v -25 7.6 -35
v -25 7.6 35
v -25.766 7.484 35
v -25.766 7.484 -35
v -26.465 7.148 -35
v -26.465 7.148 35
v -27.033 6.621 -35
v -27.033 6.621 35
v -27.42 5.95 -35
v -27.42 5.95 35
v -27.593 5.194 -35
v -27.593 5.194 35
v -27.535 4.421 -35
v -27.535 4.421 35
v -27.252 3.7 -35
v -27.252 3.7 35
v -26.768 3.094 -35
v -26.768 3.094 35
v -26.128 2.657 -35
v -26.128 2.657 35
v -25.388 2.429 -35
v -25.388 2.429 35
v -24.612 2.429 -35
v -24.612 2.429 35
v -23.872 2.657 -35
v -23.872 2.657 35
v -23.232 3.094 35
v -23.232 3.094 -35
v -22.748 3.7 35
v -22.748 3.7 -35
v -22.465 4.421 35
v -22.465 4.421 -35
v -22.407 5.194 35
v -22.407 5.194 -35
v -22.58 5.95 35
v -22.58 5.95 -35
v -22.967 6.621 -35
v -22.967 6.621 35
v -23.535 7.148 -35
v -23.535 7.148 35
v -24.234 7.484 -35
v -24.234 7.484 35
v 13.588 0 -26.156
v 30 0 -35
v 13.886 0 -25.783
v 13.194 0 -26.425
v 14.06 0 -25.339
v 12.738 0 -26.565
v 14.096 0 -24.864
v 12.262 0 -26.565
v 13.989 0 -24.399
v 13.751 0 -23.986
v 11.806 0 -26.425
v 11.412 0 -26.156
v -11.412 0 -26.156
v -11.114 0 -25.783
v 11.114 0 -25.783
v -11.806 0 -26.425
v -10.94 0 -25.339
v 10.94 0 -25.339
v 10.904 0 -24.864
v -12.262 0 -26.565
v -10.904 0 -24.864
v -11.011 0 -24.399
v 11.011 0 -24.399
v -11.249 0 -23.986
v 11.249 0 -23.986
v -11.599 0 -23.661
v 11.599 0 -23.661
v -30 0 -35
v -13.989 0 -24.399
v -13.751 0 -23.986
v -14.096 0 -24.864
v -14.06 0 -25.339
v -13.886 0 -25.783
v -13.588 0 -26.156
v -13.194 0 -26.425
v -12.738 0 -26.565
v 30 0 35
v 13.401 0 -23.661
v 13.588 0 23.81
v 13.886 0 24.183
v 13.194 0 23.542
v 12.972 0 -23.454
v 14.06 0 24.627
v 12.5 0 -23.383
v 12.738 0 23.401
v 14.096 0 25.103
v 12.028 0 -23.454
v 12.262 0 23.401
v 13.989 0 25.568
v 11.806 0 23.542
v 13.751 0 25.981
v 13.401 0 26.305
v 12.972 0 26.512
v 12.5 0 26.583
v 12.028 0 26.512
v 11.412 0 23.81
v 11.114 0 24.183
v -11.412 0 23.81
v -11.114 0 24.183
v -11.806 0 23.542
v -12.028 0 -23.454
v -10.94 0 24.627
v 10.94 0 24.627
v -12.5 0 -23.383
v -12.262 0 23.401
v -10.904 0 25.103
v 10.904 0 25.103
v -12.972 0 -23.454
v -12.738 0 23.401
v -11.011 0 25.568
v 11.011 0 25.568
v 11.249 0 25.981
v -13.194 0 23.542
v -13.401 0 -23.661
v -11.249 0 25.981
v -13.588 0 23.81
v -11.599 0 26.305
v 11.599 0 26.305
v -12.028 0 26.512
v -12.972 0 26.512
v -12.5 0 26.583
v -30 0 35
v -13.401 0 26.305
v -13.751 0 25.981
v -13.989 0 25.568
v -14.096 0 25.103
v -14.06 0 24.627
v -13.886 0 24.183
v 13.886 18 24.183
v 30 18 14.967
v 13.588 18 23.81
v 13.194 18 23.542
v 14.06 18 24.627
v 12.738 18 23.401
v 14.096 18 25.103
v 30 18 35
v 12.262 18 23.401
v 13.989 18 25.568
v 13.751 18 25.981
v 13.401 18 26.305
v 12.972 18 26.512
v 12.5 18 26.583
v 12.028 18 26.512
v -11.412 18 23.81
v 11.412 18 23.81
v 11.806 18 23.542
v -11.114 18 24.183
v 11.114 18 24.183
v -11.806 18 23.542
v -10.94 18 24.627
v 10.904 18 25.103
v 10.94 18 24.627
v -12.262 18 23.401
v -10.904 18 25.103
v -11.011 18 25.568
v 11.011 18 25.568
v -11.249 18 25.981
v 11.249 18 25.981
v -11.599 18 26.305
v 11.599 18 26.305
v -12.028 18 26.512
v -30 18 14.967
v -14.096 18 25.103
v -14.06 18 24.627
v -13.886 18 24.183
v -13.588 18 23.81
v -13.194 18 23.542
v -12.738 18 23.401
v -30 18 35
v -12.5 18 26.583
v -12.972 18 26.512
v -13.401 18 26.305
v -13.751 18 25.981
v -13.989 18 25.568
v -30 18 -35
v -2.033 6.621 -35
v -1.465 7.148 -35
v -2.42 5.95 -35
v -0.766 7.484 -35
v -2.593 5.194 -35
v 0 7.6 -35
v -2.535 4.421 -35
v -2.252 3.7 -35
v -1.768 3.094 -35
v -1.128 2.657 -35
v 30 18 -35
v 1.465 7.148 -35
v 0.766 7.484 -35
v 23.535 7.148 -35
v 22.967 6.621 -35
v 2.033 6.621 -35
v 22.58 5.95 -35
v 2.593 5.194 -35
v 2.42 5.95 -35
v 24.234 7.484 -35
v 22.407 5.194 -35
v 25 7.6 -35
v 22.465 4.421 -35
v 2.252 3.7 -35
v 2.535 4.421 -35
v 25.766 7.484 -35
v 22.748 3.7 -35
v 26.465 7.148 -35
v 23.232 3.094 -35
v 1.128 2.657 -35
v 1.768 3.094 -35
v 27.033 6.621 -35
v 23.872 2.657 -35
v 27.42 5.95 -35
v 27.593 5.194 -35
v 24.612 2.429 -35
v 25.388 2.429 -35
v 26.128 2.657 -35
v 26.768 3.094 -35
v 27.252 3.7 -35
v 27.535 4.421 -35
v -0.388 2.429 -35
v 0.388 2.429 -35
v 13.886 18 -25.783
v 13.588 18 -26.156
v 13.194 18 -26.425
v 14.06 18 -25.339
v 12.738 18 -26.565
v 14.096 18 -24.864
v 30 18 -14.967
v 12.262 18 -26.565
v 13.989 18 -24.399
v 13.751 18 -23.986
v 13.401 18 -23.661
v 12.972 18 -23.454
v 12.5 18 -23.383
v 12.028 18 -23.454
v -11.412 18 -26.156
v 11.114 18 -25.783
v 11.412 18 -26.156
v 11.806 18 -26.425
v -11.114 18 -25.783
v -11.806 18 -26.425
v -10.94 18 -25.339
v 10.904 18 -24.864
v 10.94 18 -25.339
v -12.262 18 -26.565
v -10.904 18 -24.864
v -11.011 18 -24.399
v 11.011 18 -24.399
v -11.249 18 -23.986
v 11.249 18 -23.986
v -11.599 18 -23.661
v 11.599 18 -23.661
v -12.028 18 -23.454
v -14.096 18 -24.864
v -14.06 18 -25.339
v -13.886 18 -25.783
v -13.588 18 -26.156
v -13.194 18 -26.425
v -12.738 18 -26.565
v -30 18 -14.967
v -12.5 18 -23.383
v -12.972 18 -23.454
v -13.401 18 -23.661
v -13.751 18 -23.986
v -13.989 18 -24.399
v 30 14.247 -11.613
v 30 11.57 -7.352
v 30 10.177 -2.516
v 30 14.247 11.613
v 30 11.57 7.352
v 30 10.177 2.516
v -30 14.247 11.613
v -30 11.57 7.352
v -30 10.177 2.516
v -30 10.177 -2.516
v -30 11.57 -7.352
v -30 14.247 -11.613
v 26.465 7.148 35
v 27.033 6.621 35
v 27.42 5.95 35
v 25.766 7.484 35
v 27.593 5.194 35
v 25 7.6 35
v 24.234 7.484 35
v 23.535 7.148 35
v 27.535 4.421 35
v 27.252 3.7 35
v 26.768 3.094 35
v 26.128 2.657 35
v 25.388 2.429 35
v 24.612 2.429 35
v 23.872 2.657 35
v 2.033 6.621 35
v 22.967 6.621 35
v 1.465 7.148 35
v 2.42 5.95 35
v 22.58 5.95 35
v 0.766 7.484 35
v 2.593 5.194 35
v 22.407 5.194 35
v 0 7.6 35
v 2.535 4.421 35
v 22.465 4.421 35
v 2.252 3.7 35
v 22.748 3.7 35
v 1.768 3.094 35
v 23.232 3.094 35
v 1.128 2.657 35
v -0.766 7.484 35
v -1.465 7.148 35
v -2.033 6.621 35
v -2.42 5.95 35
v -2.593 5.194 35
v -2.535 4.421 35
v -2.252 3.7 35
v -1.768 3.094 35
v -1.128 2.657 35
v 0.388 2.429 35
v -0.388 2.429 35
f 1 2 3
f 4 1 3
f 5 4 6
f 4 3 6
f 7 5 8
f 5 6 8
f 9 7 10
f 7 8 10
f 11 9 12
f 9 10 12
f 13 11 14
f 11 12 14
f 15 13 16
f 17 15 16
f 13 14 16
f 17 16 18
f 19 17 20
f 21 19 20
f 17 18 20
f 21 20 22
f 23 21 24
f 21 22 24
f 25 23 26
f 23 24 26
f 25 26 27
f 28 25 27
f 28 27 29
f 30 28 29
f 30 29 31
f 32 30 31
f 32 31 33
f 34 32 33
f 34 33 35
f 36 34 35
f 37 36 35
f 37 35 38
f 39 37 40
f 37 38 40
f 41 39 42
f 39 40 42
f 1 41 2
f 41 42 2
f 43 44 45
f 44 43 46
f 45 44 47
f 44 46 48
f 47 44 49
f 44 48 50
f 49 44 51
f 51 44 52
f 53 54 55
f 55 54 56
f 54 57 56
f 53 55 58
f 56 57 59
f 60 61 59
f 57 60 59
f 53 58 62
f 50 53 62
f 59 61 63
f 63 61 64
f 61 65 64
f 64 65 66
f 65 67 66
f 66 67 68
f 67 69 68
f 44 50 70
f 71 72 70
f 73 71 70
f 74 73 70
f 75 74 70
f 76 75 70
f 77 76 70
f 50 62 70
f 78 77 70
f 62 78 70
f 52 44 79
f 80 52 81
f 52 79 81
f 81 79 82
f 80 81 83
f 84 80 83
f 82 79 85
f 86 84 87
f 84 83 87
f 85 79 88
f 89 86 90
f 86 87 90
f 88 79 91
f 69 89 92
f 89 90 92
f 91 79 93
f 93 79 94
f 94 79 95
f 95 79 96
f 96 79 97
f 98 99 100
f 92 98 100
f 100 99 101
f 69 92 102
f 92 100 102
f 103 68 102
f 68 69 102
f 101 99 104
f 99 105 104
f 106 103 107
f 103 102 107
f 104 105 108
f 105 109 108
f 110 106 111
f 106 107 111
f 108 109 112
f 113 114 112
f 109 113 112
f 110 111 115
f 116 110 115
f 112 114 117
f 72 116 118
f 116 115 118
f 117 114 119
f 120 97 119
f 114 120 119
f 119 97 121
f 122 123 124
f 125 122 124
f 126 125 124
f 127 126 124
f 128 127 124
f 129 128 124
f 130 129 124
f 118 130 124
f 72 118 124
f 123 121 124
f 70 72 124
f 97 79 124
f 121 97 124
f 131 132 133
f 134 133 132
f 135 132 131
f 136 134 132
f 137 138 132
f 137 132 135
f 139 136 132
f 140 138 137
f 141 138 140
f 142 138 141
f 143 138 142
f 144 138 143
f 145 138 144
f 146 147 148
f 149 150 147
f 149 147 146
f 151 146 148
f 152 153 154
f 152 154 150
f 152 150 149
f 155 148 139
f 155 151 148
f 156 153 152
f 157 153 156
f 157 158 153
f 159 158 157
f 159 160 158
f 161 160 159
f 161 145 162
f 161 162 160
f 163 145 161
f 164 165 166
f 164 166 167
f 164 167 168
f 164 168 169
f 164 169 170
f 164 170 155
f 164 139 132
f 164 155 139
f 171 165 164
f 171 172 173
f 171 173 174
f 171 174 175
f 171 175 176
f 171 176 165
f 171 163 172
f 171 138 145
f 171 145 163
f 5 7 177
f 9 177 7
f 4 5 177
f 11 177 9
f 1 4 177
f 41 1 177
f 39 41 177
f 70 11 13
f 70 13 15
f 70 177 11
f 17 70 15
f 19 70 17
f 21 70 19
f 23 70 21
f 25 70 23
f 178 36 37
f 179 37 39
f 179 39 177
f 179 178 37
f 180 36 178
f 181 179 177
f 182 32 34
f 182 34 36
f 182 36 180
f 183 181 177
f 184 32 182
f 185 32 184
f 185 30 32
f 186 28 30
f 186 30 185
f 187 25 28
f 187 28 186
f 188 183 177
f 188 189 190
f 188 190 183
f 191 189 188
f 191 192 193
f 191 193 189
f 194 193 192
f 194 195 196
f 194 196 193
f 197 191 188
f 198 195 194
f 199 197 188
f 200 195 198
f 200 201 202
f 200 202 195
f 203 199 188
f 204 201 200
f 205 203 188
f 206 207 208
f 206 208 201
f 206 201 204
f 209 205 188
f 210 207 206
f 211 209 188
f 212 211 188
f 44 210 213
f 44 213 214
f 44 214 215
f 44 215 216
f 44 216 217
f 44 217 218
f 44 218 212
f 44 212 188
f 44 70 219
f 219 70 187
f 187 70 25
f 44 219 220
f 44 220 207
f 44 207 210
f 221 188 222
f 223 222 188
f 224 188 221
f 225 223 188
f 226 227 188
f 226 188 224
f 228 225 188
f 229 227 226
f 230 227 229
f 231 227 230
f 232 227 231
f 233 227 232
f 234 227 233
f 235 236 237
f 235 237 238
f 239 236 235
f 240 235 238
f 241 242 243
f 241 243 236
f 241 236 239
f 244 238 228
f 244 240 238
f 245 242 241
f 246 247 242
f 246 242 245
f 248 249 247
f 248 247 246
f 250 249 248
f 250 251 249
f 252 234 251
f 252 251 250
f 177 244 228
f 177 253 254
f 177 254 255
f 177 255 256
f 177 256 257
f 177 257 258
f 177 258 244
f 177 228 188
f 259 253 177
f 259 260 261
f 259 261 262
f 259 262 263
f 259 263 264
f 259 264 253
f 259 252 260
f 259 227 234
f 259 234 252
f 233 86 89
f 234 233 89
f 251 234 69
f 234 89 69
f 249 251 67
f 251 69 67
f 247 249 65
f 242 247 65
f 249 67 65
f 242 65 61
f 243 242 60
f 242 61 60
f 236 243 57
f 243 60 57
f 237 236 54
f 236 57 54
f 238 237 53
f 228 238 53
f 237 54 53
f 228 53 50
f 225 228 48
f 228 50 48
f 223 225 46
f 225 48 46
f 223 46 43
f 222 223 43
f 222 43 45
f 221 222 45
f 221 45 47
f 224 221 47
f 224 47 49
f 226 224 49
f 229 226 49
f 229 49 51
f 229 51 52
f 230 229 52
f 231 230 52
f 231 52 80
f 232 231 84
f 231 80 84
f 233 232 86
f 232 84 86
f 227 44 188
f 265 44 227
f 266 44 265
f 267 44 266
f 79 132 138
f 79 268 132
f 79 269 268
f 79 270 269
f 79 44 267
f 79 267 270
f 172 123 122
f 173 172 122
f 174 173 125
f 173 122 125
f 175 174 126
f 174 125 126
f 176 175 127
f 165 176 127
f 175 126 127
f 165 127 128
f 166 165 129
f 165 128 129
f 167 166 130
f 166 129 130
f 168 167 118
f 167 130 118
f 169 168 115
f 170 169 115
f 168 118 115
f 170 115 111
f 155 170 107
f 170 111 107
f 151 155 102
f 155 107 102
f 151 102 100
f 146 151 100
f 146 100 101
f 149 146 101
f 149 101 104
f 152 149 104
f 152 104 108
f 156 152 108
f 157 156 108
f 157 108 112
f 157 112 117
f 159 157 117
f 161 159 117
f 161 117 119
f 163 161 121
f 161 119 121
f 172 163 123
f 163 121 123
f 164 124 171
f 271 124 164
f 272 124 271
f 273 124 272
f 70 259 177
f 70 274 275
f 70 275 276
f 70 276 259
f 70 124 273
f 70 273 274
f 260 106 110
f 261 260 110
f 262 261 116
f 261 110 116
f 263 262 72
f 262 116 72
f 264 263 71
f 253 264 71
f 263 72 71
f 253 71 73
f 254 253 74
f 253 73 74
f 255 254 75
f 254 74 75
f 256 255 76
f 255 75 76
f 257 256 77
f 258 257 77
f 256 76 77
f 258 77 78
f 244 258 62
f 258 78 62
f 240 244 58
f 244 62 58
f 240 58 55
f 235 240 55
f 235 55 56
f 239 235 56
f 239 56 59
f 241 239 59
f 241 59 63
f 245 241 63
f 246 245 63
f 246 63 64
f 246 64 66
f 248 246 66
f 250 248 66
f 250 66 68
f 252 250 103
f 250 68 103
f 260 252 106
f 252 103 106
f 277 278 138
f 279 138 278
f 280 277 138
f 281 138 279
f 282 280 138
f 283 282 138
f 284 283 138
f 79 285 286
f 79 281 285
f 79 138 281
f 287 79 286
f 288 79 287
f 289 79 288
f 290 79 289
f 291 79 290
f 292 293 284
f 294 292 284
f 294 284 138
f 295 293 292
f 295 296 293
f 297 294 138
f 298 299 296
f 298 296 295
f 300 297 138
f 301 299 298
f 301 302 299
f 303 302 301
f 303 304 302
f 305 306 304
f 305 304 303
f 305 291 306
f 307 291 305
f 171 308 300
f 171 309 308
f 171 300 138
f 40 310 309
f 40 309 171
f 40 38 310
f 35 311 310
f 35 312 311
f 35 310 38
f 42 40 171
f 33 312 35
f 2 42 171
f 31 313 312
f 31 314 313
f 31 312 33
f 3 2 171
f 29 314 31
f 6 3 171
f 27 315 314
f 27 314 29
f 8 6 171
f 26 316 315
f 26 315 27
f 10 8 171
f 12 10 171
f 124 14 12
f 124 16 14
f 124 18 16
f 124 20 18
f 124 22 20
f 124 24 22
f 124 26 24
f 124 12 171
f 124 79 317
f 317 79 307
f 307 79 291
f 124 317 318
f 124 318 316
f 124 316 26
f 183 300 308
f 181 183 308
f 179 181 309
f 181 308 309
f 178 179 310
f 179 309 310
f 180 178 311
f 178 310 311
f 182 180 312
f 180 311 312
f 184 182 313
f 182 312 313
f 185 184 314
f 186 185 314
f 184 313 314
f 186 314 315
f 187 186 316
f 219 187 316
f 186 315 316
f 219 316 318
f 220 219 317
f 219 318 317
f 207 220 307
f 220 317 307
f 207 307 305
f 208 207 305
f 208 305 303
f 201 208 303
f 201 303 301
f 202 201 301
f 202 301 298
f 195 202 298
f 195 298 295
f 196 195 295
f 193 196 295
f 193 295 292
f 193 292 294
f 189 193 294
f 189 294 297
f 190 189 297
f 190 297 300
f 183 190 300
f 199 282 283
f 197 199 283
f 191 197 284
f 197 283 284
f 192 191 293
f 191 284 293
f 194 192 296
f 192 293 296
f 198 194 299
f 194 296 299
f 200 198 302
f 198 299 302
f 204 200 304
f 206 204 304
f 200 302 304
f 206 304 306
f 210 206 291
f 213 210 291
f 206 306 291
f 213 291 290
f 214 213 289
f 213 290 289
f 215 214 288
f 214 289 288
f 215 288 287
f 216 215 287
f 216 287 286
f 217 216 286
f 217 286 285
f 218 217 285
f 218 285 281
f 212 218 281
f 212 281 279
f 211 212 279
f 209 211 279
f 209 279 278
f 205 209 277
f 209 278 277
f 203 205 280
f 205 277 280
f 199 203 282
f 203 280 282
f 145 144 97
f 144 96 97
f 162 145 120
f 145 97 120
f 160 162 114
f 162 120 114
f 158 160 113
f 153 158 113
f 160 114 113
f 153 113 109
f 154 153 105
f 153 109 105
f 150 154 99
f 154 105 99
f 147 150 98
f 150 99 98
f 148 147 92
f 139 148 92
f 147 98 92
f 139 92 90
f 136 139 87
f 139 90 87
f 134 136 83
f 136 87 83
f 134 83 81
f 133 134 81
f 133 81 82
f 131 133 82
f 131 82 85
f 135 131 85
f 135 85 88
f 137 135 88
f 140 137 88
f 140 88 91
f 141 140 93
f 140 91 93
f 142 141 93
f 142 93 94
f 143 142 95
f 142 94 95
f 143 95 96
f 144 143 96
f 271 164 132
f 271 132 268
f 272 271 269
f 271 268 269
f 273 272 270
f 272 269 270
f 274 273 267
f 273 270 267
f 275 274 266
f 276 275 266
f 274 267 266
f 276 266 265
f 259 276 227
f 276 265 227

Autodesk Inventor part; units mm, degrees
ref_plane "YZ Plane" through (0, 0, 0) normal (1, 0, 0) x (0, 1, 0)
ref_plane "XZ Plane" through (0, 0, 0) normal (0, 1, 0) x (-1, 0, 0)
ref_plane "XY Plane" through (0, 0, 0) normal (0, 0, 1) x (1, 0, 0)
sketch "Sketch1" plane through (0, 0, 0) normal (0, 1, 0) x (-1, 0, 0)
  line L0 (-30, 35) -> (30, 35)
  line L1 (30, 35) -> (30, -35)
  line L2 (30, -35) -> (-30, -35)
  line L3 (-30, -35) -> (-30, 35)
  line L4 (-30, 35) -> (30, -35) construction
  line L5 (30, 35) -> (-30, -35) construction
  point P0 (0, 0)
  dimension "d0" = 60
  dimension "d1" = 70
extrude "Extrusion1" add sketch "Sketch1" along normal blind 18
sketch "Sketch2" plane through (30, 0, -35) normal (0, 0, -1) x (-1, 0, 0)
  line L0 (0, 0) -> (60, 0) projected
  line L1 (60, 0) -> (60, 18) projected
  line L2 (0, 18) -> (60, 18) projected
  line L3 (0, 0) -> (0, 18) projected
  line L4 (0, 5) -> (60, 5) construction
  line L5 (30, 0) -> (30, 18) construction
  line L6 (0, 18) -> (60, 18) projected
  point P0 (5, 5)
  point P1 (30, 5)
  point P2 (55, 5)
  dimension "d4" = 5
  dimension "d6" = 5
hole "Hole1" at (25, 5, -35) at (0, 5, -35) at (-25, 5, -35) direction (0, 0, 1) diameter 5.2 end through all
sketch "Sketch3" plane through (30, 0, 35) normal (1, 0, 0) x (0, 0, -1)
  line L0 (0, 2.4) -> (70, 2.4) projected
  line L1 (0, 2.4) -> (0, 7.6) projected
  line L2 (70, 7.6) -> (70, 2.4) projected
  line L3 (0, 7.6) -> (70, 7.6) projected
  line L4 (0, 0) -> (70, 0) projected
  line L5 (70, 0) -> (70, 18) projected
  line L6 (0, 18) -> (70, 18) projected
  line L7 (0, 0) -> (0, 18) projected
  circle A0 centre (35, 28) radius 18
  point P0 (35, 0)
  point P1 (35, 0)
  point P2 (49.9666, 18)
  point P3 (20.0334, 18)
  dimension "d14" = 36
  dimension "d15" = 10
extrude "Extrusion2" cut sketch "Sketch3" against normal through all contours L6 A0 picked at (30.9706, 16.8877)
sketch "Sketch4" plane through (0, 18, 0) normal (0, 1, 0) x (1, 0, 0)
  line L0 (-22.4, -35) -> (-27.6, -35) projected
  line L1 (-27.6, 35) -> (-22.4, 35) projected
  line L2 (2.6, -35) -> (-2.6, -35) projected
  line L3 (-2.6, 35) -> (2.6, 35) projected
  line L4 (27.6, -35) -> (22.4, -35) projected
  line L5 (22.4, 35) -> (27.6, 35) projected
  line L6 (-30, -35) -> (30, -35) projected
  line L7 (-12.5, -35) -> (-12.5, 35) construction
  line L8 (2.6, 35) -> (22.4, 35)
  line L9 (2.6, -35) -> (2.6, 35) projected
  line L10 (-22.4, 35) -> (-2.6, 35)
  line L11 (-22.4, -35) -> (-22.4, 35) projected
  line L12 (12.5, 35) -> (12.5, -35) construction
  line L13 (-30, -14.9666) -> (-30, -35) projected
  line L14 (-30, 35) -> (-30, 14.9666) projected
  line L15 (-30, 24.9833) -> (10, 24.9833) construction
  line L16 (-30, -24.9833) -> (30, -24.9833) construction
  line L17 (30, -35) -> (30, -14.9666) projected
  point P0 (0, 0)
  point P1 (-12.5, -24.9833)
  point P2 (12.5, -24.9833)
  point P3 (12.5, 24.9833)
  point P4 (-12.5, 24.9833)
hole "Hole2" at (-12.5, 18, 24.9833) at (12.5, 18, 24.9833) at (12.5, 18, -24.9833) at (-12.5, 18, -24.9833) direction (0, -1, 0) diameter 3.2 end through all
properties part number "18_Kep_han_A" material "ABS Plastic"
